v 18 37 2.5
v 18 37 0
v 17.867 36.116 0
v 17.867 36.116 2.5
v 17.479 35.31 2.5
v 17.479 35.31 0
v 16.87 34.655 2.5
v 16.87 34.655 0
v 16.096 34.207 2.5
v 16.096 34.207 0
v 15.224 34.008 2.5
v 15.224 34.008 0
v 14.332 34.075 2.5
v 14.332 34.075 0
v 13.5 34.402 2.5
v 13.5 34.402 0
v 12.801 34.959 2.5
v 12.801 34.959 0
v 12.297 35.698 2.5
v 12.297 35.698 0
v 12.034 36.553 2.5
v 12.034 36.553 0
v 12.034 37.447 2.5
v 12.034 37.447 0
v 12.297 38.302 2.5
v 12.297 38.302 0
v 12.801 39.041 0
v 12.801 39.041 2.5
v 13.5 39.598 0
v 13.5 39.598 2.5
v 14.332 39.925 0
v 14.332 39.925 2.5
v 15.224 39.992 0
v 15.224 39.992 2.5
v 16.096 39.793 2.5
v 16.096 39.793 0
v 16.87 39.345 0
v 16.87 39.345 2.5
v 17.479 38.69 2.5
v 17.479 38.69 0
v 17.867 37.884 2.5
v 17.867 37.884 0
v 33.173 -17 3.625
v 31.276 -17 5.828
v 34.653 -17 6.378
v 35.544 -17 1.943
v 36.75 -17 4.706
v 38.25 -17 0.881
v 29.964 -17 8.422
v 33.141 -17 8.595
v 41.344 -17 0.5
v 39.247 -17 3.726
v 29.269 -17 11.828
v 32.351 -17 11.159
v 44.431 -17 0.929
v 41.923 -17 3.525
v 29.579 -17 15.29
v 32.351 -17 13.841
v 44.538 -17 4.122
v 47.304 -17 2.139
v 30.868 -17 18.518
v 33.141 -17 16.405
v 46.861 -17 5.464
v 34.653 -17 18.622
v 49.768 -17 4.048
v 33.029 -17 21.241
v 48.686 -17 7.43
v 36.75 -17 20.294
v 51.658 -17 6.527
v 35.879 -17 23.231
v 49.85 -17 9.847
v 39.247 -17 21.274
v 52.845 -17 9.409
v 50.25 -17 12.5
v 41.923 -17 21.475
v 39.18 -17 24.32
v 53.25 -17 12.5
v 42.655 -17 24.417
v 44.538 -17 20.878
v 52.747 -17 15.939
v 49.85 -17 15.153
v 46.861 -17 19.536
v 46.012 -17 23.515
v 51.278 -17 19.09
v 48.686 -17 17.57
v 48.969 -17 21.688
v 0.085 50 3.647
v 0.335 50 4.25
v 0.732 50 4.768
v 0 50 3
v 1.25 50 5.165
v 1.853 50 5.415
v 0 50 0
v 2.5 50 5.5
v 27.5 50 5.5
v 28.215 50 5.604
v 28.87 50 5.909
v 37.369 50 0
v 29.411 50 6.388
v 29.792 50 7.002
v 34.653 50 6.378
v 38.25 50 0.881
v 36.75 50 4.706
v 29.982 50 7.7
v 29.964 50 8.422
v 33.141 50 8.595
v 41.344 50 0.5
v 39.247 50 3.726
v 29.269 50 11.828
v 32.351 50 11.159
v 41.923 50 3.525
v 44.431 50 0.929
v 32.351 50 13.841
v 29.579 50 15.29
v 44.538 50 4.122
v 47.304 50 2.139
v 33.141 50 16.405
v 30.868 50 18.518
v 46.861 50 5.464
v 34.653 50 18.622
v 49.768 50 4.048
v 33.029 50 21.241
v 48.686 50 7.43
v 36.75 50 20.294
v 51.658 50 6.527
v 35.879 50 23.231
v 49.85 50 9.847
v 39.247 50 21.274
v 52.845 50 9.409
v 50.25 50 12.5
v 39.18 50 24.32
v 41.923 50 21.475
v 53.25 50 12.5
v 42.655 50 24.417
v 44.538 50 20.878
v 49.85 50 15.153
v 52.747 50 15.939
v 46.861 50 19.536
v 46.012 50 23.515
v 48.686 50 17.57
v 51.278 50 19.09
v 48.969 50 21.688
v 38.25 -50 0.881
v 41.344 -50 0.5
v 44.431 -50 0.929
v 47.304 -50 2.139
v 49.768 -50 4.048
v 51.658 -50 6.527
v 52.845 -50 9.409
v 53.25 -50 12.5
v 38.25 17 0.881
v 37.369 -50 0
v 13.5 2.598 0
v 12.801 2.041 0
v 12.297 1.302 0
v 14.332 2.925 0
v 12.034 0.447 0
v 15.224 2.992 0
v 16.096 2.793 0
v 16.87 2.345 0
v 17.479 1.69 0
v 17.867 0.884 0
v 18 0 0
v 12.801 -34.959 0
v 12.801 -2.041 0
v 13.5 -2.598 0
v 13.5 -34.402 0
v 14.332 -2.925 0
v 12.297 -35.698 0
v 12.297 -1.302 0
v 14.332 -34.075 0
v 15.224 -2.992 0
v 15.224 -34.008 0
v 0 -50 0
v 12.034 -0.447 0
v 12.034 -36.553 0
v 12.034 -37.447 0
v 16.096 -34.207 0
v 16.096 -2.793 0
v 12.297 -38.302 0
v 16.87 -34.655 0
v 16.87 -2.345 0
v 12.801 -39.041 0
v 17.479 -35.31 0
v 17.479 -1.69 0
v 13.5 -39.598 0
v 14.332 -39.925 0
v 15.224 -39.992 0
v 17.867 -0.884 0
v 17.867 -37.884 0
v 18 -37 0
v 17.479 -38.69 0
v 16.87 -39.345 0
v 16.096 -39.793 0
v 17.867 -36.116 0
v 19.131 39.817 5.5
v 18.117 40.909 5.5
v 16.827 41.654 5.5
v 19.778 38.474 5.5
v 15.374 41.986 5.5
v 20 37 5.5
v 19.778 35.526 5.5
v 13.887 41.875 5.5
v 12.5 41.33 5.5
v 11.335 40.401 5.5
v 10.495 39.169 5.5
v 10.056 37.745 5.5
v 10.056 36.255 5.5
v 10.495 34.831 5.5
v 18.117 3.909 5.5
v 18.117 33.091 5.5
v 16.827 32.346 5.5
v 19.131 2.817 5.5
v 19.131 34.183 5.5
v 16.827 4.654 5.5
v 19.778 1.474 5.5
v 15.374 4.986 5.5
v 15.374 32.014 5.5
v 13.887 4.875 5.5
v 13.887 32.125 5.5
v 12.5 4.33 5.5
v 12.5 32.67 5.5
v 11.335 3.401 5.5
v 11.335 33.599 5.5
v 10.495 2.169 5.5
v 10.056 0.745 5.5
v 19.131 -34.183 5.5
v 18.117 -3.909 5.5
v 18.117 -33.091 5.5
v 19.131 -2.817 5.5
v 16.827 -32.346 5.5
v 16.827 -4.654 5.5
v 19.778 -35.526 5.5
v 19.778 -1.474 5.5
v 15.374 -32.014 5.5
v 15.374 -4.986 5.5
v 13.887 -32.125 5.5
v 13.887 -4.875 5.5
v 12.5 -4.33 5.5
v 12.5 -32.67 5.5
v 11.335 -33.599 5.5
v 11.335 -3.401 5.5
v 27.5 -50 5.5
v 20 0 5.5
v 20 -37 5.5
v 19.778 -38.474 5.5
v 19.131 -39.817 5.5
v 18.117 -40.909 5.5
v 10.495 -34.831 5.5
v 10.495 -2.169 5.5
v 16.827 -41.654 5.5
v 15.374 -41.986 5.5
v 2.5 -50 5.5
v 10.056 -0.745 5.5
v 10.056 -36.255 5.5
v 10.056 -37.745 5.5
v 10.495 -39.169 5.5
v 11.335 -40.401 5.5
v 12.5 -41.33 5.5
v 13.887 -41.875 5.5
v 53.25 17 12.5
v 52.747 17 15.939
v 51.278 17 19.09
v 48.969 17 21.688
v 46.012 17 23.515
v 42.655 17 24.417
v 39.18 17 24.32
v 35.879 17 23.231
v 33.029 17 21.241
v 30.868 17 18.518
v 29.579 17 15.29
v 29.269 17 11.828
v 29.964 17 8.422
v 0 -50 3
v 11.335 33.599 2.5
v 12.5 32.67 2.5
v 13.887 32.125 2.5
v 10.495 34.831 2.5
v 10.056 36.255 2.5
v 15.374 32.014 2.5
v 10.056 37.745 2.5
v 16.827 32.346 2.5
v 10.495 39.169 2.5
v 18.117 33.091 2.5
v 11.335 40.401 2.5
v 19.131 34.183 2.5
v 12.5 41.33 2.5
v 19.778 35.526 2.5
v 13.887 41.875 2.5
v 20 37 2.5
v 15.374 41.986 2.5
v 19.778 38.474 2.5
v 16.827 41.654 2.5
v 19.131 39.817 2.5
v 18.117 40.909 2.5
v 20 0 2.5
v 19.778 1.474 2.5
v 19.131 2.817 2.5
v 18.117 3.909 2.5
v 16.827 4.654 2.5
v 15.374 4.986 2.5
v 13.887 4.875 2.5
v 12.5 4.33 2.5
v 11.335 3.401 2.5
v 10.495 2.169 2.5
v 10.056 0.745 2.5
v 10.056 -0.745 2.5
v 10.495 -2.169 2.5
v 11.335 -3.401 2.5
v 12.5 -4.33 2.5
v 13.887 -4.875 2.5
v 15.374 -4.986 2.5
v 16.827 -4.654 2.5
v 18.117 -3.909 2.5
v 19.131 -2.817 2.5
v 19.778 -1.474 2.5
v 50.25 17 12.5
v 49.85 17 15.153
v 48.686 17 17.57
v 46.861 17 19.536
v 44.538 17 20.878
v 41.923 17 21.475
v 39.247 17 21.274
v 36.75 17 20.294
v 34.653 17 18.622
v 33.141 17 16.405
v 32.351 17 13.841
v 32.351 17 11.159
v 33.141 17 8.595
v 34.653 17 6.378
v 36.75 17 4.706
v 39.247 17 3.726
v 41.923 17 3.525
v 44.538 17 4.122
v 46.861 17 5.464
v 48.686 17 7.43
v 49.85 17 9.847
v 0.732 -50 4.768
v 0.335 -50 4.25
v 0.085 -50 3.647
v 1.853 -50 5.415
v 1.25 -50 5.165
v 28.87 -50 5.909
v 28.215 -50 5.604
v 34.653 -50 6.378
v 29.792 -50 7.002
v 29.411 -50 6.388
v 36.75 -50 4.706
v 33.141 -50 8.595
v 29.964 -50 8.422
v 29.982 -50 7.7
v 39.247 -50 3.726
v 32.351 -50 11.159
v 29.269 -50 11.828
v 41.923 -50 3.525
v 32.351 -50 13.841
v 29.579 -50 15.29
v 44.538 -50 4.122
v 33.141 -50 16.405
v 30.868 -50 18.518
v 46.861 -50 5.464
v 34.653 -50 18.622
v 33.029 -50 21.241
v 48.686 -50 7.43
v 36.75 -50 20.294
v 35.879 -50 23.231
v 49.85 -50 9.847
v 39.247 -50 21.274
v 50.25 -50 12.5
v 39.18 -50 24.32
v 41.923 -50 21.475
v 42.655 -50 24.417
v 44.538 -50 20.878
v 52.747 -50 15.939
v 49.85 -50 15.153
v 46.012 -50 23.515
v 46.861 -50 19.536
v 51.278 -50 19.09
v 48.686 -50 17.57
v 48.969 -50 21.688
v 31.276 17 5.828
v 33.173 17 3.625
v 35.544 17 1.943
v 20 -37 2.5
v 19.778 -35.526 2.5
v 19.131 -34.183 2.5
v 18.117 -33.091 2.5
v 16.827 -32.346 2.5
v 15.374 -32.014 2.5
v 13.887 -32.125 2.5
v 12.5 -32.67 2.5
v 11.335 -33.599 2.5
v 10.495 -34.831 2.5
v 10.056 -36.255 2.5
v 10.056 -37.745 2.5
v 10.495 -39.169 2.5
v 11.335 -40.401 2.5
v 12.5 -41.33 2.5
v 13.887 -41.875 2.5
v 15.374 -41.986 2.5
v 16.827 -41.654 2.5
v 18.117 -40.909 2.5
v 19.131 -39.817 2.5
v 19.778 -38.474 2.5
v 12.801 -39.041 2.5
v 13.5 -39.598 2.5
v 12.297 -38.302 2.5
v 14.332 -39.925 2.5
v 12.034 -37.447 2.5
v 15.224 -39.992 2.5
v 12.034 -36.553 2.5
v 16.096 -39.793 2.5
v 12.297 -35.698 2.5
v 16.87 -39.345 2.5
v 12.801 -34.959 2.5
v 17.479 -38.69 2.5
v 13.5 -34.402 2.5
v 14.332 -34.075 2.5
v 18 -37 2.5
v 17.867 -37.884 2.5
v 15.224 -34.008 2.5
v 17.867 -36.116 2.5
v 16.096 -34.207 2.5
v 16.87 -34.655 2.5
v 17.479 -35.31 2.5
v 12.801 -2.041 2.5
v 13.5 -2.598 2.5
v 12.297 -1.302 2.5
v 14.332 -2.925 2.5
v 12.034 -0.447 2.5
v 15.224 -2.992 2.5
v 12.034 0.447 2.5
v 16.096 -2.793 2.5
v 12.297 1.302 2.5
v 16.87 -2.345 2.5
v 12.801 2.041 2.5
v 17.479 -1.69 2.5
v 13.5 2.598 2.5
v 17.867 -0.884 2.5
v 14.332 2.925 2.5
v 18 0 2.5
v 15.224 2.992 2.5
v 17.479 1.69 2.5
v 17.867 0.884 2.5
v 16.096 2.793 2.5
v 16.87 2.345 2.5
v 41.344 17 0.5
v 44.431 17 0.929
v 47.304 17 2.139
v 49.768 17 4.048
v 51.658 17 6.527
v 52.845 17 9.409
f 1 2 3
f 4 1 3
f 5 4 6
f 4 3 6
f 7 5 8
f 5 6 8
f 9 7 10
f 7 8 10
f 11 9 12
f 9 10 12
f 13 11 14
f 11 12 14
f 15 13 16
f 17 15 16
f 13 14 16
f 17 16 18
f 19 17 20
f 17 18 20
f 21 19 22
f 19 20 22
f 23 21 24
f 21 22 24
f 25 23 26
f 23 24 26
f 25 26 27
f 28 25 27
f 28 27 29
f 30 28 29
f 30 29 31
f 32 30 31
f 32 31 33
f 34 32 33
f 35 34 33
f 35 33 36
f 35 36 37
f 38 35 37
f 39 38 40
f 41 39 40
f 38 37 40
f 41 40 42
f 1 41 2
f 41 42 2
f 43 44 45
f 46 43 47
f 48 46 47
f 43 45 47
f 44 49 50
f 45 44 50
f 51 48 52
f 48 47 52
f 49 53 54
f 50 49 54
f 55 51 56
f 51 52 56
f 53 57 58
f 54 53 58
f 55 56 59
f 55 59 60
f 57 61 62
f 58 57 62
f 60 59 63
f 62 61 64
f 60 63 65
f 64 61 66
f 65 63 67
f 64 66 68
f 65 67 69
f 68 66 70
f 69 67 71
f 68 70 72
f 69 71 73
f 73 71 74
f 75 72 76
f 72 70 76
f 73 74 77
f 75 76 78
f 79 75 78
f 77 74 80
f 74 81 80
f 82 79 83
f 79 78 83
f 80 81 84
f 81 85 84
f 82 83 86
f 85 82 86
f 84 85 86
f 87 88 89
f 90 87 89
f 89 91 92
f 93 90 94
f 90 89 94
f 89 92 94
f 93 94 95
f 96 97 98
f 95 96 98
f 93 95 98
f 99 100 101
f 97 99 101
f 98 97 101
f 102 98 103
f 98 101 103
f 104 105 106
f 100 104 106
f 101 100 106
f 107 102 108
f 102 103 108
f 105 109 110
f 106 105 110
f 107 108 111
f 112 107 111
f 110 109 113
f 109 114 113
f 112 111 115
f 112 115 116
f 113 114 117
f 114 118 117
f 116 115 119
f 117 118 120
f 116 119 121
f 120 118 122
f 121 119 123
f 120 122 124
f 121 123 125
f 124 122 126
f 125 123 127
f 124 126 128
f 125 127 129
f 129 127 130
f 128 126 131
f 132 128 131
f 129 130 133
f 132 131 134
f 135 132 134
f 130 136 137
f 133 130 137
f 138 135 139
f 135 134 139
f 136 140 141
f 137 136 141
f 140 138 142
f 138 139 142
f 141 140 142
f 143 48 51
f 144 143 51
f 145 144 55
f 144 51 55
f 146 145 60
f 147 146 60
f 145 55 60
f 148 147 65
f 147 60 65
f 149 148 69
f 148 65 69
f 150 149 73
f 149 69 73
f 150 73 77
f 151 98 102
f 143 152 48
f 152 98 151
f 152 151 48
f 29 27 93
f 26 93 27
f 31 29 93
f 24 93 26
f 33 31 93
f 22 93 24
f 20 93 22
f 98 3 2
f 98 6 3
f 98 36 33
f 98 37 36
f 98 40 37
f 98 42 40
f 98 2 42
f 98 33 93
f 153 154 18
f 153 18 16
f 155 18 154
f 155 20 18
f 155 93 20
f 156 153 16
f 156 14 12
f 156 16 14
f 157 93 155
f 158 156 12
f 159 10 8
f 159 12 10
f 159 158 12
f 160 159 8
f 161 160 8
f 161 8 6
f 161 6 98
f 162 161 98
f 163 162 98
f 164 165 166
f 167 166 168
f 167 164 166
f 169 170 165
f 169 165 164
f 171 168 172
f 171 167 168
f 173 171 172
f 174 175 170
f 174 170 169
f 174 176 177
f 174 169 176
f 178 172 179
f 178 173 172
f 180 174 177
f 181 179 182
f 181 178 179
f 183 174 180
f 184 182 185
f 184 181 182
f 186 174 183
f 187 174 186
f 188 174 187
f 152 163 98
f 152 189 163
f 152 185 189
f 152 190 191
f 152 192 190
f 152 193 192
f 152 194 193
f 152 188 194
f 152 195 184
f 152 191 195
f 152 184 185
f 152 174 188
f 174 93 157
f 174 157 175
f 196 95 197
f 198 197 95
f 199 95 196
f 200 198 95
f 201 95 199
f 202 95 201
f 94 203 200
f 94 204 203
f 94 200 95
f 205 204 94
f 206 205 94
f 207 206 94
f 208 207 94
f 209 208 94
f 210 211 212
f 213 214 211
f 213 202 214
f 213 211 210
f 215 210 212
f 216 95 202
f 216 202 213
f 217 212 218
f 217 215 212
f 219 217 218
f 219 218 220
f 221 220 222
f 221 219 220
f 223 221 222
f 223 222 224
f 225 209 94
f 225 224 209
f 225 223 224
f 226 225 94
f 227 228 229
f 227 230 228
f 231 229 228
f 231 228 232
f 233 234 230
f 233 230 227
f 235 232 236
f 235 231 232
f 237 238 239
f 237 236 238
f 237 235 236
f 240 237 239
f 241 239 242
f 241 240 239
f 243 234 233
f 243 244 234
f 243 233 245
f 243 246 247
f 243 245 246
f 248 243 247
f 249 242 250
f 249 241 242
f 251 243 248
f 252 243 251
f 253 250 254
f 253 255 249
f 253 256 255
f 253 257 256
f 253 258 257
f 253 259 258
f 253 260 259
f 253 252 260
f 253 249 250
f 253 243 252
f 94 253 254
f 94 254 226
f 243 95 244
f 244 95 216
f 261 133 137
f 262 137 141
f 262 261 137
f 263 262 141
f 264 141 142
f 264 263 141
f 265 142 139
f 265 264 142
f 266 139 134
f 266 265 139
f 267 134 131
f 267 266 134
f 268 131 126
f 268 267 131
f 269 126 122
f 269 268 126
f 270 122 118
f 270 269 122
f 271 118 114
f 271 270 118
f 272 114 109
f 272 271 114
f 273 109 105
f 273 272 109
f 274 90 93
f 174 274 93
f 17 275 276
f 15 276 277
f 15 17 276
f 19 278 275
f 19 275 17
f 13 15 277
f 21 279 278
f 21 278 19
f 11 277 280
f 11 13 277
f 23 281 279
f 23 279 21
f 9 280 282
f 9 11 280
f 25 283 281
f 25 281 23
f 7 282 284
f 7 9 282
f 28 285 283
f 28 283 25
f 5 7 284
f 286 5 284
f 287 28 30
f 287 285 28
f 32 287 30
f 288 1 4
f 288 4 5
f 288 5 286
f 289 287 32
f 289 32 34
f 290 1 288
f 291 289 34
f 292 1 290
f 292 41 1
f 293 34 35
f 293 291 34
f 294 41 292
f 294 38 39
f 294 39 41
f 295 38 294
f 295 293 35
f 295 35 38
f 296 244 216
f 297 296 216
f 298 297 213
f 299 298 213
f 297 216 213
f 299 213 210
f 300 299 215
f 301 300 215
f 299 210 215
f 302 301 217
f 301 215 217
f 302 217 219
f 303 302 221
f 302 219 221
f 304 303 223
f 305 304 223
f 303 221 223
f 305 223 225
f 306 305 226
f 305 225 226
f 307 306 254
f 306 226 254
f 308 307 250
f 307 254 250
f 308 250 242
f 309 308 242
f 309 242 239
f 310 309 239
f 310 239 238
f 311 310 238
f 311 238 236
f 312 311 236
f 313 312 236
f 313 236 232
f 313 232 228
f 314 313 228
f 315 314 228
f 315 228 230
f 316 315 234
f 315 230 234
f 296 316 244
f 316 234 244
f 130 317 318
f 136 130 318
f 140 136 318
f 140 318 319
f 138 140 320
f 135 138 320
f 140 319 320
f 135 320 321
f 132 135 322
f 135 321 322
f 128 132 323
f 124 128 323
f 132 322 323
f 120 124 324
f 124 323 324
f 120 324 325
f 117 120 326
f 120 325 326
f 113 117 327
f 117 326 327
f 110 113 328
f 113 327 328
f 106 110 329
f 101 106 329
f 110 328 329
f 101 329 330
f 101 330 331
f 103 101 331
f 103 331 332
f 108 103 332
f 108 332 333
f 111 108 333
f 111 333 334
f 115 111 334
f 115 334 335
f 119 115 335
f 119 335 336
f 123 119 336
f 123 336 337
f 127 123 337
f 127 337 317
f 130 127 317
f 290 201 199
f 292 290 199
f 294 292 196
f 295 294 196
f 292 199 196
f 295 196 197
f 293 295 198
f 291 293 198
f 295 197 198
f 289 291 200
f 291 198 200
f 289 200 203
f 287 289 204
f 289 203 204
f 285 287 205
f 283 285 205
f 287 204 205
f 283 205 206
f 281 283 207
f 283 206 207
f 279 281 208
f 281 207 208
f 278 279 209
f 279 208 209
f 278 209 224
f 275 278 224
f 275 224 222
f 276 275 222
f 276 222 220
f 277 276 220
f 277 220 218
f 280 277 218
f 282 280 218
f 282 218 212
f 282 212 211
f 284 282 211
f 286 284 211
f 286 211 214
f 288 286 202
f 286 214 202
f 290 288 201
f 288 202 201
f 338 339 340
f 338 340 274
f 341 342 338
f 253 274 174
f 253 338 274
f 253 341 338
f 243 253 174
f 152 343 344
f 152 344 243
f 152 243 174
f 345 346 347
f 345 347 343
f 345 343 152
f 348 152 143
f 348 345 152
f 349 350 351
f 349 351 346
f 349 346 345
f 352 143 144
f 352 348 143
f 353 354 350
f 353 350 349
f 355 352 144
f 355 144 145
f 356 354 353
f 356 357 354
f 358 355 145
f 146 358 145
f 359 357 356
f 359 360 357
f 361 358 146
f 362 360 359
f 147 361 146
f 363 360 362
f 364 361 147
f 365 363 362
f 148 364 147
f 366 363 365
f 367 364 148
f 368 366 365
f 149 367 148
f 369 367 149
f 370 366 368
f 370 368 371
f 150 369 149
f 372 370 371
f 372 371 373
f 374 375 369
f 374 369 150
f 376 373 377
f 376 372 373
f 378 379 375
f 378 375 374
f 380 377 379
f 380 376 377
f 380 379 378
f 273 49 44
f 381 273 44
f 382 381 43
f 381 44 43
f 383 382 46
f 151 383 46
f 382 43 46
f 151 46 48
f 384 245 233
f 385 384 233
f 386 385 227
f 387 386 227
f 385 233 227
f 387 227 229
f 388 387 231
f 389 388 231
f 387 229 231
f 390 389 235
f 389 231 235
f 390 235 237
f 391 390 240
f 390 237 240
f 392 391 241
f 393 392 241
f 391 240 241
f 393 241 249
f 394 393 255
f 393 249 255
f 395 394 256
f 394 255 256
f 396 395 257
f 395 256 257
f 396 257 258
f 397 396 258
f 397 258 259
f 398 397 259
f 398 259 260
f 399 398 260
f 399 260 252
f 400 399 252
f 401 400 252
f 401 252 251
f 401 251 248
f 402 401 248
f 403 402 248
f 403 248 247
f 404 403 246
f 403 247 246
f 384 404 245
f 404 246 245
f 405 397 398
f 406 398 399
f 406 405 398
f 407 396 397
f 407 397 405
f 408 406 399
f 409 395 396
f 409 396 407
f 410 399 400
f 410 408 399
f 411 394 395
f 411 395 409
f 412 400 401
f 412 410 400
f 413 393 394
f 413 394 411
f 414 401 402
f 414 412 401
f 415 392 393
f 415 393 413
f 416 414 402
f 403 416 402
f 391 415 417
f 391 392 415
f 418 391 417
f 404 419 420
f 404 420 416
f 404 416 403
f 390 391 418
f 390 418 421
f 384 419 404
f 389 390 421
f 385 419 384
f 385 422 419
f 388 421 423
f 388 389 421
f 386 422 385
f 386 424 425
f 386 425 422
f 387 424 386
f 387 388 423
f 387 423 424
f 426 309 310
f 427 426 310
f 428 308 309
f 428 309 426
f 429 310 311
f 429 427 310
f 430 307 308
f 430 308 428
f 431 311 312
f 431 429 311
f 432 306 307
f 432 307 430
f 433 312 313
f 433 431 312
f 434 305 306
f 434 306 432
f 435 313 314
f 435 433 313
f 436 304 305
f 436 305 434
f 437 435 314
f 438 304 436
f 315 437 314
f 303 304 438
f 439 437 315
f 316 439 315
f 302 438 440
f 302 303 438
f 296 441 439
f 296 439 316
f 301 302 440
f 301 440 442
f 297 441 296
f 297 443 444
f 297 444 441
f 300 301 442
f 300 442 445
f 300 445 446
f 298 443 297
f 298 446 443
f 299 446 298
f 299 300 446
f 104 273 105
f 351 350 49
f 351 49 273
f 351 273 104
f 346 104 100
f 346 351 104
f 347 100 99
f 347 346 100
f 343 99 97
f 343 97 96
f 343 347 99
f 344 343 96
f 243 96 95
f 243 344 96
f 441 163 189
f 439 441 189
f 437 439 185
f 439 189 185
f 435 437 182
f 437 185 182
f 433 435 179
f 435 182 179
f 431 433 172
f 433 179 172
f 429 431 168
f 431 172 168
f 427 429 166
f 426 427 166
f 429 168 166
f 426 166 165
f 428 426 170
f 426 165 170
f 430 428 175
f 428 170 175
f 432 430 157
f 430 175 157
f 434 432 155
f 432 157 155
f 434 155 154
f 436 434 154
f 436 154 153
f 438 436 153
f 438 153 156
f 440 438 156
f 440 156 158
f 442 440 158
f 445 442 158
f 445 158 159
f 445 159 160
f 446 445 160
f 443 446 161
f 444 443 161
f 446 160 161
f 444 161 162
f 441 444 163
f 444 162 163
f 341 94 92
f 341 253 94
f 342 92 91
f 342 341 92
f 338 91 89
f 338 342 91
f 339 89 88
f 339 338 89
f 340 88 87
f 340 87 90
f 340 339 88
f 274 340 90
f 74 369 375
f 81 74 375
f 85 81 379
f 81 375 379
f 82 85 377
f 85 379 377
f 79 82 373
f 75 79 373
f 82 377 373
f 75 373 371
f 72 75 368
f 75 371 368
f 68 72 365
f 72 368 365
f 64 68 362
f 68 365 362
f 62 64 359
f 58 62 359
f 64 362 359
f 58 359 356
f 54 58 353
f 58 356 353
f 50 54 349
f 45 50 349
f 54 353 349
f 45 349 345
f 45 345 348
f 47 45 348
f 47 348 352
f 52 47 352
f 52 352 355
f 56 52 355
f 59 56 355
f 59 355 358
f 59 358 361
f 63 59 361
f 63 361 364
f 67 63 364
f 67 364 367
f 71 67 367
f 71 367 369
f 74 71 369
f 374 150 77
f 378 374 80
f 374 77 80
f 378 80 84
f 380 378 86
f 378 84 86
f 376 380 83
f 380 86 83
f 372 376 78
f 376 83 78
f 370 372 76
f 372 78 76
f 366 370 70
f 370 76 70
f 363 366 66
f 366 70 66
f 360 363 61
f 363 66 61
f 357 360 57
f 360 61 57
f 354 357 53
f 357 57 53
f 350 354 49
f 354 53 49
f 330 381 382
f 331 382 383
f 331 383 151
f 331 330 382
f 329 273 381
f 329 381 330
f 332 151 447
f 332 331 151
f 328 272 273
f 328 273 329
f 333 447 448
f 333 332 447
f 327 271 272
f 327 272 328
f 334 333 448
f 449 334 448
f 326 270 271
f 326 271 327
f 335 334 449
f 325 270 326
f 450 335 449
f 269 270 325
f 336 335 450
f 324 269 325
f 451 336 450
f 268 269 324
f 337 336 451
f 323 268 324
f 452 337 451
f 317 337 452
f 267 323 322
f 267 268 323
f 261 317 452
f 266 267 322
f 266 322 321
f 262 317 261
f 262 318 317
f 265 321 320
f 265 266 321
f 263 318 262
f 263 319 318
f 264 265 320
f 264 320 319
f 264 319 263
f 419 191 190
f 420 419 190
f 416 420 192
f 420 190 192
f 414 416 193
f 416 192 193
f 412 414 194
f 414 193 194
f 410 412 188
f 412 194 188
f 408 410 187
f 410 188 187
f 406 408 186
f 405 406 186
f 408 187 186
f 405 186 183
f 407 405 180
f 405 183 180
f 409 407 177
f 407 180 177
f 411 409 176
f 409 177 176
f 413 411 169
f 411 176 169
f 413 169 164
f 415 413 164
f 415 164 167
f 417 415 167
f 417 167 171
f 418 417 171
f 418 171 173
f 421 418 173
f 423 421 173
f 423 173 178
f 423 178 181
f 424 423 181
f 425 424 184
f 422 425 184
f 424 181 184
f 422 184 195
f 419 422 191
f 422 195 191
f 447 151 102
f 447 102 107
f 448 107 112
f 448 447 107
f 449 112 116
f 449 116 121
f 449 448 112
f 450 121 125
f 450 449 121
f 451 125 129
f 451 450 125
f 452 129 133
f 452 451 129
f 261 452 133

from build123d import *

# Parameters (mm, degrees)
F1_DEPTH  = 50
F2_R      = 2.5
F3_R      = 9
F4_DEPTH  = 100
F6_START  = -33
F5_R      = 12
F6_DEPTH  = 34
F7_R      = 5
F9_DEPTH  = 3
F8_R      = 3
F10_DEPTH = 2.5


with BuildPart() as f1:
    # F0 (on Front) → F1 (new body, symmetric)
    with BuildSketch(Plane.XZ):
        with BuildLine():
            Line((27.5, 5.5), (0, 5.5))
            Line((0, 5.5), (0, 0))
            Line((0, 0), (37.3689500386, 0))
            Line((37.3689500386, 0), (38.25, 0.8810499614))
            ThreePointArc((38.25, 0.8810499614), (33.172918626, 3.6252742871), (29.9640842591, 8.4222425415))
            ThreePointArc((29.9640842591, 8.4222425415), (29.4112308016, 6.388417913), (27.5, 5.5))
        make_face()
        with BuildLine():
            ThreePointArc((53.25, 12.5), (39.1800952788, 24.320130898), (29.9640842591, 8.4222425415))
            ThreePointArc((29.9640842591, 8.4222425415), (33.172918626, 3.6252742871), (38.25, 0.8810499614))
            ThreePointArc((38.25, 0.8810499614), (48.5984692283, 3.0131670195), (53.25, 12.5))
        make_face()
    extrude(amount=F1_DEPTH, both=True)

    # F2
    f2_edges = [f1.edges().sort_by_distance(p)[0] for p in [
        (0, 0, 5.5),
    ]]
    fillet(f2_edges, radius=F2_R)

    # F3 (on face) → F4 (cut, through all)
    with BuildSketch(Plane.XZ.offset(50)):
        with Locations((41.25, 12.5)):
            Circle(F3_R)
    extrude(amount=-F4_DEPTH, mode=Mode.SUBTRACT)

    # F5 (on face) → F6 (cut)
    with BuildSketch(Plane.XZ.offset(50).offset(F6_START)):
        with Locations((41.25, 12.5)):
            Circle(F5_R)
    extrude(amount=-F6_DEPTH, mode=Mode.SUBTRACT)

    # F7 (on face) → F9 (cut)
    with BuildSketch(Plane.XY.offset(5.5)):
        with Locations((15, 0)):
            Circle(F7_R)
        with Locations((15, 37)):
            Circle(F7_R)
        with Locations((15, -37)):
            Circle(F7_R)
    extrude(amount=-F9_DEPTH, mode=Mode.SUBTRACT)

    # F8 (on face) → F10 (cut, through all)
    with BuildSketch(Plane(origin=(0, 0, 0), x_dir=(1, 0, 0), z_dir=(0, 0, -1))):
        with Locations((15, -37)):
            Circle(F8_R)
        with Locations((15, 0)):
            Circle(F8_R)
        with Locations((15, 37)):
            Circle(F8_R)
    extrude(amount=-F10_DEPTH, mode=Mode.SUBTRACT)


solid = f1.part
